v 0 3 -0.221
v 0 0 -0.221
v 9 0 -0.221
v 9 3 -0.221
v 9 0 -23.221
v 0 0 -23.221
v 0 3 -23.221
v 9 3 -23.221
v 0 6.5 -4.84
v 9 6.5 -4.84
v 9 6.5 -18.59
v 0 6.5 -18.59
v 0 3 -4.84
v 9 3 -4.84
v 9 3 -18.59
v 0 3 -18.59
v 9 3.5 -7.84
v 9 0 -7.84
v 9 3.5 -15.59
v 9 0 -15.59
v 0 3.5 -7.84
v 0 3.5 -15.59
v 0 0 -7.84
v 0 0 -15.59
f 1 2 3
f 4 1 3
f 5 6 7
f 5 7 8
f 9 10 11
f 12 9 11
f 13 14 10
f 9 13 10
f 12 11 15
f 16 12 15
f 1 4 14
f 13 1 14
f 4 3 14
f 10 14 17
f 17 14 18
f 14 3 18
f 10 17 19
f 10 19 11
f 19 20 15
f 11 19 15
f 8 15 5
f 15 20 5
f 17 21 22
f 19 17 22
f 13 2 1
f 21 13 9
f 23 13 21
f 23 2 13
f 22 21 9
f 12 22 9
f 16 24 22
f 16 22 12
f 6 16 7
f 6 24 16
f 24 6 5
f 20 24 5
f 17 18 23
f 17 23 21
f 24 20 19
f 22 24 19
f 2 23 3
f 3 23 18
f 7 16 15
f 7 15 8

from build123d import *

# Parameters (mm, degrees)
SKETCH1_W           = 9
SKETCH1_H           = 23
BOSS_EXTRUDE1_DEPTH = 15
SKETCH2_W           = 7.75
SKETCH2_H           = 3.5
CUT_EXTRUDE1_DEPTH  = 15


with BuildPart() as part:
    # Sketch1 → Boss-Extrude1 (new body)
    with BuildSketch(Plane(origin=(0, 0, 0), x_dir=(1, 0, 0), z_dir=(0, 1, 0))):
        with Locations((4.5, 11.721182832)):
            Rectangle(SKETCH1_W, SKETCH1_H)
    extrude(amount=BOSS_EXTRUDE1_DEPTH)

    # Sketch2 → Cut-Extrude1 (cut)
    with BuildSketch(Plane(origin=(9, 0, 0), x_dir=(0, 0, -1), z_dir=(1, 0, 0))):
        Polygon((0.221182832, 3), (4.83959223, 3), (4.83959223, 6.5), (18.58959223, 6.5), (18.58959223, 3), (23.221182832, 3), (23.221182832, 15), (0.221182832, 15), align=None)
        with Locations((11.71459223, 1.75)):
            Rectangle(SKETCH2_W, SKETCH2_H)
    extrude(amount=-CUT_EXTRUDE1_DEPTH, mode=Mode.SUBTRACT)


solid = part.part
